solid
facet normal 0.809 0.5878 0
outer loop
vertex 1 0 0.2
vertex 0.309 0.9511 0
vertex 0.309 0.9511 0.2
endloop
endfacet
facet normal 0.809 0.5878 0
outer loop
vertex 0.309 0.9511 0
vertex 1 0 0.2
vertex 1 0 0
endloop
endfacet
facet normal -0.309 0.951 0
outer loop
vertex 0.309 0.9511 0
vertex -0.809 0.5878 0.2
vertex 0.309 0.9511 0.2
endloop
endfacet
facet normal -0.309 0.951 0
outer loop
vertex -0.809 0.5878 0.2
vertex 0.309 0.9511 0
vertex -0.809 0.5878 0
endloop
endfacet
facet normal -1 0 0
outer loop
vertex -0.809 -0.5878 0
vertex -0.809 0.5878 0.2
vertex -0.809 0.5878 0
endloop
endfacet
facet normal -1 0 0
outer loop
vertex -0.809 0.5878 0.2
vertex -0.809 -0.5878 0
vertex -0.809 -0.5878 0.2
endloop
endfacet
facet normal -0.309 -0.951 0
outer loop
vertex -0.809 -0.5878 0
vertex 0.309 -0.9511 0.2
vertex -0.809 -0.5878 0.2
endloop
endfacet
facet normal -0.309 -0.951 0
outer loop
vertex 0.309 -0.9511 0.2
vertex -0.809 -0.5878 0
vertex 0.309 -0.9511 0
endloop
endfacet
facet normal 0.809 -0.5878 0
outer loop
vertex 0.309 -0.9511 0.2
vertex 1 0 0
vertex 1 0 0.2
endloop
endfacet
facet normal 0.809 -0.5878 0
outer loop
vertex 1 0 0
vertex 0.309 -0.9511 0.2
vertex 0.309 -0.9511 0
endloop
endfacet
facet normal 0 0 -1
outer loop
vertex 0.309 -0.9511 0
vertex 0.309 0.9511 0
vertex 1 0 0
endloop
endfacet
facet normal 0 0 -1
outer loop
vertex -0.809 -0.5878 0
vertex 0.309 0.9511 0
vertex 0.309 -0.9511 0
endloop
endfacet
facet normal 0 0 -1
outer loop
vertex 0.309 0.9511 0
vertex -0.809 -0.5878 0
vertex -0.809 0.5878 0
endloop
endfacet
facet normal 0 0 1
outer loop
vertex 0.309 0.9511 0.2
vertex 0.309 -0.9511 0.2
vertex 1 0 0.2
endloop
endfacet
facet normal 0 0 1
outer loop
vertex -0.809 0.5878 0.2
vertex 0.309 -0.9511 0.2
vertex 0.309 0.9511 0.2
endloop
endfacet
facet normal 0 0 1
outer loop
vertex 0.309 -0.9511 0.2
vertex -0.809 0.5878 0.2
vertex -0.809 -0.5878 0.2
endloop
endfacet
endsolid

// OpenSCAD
module gear(){
    color("blue")
    cylinder(0.2,1,1);
}
gear();
